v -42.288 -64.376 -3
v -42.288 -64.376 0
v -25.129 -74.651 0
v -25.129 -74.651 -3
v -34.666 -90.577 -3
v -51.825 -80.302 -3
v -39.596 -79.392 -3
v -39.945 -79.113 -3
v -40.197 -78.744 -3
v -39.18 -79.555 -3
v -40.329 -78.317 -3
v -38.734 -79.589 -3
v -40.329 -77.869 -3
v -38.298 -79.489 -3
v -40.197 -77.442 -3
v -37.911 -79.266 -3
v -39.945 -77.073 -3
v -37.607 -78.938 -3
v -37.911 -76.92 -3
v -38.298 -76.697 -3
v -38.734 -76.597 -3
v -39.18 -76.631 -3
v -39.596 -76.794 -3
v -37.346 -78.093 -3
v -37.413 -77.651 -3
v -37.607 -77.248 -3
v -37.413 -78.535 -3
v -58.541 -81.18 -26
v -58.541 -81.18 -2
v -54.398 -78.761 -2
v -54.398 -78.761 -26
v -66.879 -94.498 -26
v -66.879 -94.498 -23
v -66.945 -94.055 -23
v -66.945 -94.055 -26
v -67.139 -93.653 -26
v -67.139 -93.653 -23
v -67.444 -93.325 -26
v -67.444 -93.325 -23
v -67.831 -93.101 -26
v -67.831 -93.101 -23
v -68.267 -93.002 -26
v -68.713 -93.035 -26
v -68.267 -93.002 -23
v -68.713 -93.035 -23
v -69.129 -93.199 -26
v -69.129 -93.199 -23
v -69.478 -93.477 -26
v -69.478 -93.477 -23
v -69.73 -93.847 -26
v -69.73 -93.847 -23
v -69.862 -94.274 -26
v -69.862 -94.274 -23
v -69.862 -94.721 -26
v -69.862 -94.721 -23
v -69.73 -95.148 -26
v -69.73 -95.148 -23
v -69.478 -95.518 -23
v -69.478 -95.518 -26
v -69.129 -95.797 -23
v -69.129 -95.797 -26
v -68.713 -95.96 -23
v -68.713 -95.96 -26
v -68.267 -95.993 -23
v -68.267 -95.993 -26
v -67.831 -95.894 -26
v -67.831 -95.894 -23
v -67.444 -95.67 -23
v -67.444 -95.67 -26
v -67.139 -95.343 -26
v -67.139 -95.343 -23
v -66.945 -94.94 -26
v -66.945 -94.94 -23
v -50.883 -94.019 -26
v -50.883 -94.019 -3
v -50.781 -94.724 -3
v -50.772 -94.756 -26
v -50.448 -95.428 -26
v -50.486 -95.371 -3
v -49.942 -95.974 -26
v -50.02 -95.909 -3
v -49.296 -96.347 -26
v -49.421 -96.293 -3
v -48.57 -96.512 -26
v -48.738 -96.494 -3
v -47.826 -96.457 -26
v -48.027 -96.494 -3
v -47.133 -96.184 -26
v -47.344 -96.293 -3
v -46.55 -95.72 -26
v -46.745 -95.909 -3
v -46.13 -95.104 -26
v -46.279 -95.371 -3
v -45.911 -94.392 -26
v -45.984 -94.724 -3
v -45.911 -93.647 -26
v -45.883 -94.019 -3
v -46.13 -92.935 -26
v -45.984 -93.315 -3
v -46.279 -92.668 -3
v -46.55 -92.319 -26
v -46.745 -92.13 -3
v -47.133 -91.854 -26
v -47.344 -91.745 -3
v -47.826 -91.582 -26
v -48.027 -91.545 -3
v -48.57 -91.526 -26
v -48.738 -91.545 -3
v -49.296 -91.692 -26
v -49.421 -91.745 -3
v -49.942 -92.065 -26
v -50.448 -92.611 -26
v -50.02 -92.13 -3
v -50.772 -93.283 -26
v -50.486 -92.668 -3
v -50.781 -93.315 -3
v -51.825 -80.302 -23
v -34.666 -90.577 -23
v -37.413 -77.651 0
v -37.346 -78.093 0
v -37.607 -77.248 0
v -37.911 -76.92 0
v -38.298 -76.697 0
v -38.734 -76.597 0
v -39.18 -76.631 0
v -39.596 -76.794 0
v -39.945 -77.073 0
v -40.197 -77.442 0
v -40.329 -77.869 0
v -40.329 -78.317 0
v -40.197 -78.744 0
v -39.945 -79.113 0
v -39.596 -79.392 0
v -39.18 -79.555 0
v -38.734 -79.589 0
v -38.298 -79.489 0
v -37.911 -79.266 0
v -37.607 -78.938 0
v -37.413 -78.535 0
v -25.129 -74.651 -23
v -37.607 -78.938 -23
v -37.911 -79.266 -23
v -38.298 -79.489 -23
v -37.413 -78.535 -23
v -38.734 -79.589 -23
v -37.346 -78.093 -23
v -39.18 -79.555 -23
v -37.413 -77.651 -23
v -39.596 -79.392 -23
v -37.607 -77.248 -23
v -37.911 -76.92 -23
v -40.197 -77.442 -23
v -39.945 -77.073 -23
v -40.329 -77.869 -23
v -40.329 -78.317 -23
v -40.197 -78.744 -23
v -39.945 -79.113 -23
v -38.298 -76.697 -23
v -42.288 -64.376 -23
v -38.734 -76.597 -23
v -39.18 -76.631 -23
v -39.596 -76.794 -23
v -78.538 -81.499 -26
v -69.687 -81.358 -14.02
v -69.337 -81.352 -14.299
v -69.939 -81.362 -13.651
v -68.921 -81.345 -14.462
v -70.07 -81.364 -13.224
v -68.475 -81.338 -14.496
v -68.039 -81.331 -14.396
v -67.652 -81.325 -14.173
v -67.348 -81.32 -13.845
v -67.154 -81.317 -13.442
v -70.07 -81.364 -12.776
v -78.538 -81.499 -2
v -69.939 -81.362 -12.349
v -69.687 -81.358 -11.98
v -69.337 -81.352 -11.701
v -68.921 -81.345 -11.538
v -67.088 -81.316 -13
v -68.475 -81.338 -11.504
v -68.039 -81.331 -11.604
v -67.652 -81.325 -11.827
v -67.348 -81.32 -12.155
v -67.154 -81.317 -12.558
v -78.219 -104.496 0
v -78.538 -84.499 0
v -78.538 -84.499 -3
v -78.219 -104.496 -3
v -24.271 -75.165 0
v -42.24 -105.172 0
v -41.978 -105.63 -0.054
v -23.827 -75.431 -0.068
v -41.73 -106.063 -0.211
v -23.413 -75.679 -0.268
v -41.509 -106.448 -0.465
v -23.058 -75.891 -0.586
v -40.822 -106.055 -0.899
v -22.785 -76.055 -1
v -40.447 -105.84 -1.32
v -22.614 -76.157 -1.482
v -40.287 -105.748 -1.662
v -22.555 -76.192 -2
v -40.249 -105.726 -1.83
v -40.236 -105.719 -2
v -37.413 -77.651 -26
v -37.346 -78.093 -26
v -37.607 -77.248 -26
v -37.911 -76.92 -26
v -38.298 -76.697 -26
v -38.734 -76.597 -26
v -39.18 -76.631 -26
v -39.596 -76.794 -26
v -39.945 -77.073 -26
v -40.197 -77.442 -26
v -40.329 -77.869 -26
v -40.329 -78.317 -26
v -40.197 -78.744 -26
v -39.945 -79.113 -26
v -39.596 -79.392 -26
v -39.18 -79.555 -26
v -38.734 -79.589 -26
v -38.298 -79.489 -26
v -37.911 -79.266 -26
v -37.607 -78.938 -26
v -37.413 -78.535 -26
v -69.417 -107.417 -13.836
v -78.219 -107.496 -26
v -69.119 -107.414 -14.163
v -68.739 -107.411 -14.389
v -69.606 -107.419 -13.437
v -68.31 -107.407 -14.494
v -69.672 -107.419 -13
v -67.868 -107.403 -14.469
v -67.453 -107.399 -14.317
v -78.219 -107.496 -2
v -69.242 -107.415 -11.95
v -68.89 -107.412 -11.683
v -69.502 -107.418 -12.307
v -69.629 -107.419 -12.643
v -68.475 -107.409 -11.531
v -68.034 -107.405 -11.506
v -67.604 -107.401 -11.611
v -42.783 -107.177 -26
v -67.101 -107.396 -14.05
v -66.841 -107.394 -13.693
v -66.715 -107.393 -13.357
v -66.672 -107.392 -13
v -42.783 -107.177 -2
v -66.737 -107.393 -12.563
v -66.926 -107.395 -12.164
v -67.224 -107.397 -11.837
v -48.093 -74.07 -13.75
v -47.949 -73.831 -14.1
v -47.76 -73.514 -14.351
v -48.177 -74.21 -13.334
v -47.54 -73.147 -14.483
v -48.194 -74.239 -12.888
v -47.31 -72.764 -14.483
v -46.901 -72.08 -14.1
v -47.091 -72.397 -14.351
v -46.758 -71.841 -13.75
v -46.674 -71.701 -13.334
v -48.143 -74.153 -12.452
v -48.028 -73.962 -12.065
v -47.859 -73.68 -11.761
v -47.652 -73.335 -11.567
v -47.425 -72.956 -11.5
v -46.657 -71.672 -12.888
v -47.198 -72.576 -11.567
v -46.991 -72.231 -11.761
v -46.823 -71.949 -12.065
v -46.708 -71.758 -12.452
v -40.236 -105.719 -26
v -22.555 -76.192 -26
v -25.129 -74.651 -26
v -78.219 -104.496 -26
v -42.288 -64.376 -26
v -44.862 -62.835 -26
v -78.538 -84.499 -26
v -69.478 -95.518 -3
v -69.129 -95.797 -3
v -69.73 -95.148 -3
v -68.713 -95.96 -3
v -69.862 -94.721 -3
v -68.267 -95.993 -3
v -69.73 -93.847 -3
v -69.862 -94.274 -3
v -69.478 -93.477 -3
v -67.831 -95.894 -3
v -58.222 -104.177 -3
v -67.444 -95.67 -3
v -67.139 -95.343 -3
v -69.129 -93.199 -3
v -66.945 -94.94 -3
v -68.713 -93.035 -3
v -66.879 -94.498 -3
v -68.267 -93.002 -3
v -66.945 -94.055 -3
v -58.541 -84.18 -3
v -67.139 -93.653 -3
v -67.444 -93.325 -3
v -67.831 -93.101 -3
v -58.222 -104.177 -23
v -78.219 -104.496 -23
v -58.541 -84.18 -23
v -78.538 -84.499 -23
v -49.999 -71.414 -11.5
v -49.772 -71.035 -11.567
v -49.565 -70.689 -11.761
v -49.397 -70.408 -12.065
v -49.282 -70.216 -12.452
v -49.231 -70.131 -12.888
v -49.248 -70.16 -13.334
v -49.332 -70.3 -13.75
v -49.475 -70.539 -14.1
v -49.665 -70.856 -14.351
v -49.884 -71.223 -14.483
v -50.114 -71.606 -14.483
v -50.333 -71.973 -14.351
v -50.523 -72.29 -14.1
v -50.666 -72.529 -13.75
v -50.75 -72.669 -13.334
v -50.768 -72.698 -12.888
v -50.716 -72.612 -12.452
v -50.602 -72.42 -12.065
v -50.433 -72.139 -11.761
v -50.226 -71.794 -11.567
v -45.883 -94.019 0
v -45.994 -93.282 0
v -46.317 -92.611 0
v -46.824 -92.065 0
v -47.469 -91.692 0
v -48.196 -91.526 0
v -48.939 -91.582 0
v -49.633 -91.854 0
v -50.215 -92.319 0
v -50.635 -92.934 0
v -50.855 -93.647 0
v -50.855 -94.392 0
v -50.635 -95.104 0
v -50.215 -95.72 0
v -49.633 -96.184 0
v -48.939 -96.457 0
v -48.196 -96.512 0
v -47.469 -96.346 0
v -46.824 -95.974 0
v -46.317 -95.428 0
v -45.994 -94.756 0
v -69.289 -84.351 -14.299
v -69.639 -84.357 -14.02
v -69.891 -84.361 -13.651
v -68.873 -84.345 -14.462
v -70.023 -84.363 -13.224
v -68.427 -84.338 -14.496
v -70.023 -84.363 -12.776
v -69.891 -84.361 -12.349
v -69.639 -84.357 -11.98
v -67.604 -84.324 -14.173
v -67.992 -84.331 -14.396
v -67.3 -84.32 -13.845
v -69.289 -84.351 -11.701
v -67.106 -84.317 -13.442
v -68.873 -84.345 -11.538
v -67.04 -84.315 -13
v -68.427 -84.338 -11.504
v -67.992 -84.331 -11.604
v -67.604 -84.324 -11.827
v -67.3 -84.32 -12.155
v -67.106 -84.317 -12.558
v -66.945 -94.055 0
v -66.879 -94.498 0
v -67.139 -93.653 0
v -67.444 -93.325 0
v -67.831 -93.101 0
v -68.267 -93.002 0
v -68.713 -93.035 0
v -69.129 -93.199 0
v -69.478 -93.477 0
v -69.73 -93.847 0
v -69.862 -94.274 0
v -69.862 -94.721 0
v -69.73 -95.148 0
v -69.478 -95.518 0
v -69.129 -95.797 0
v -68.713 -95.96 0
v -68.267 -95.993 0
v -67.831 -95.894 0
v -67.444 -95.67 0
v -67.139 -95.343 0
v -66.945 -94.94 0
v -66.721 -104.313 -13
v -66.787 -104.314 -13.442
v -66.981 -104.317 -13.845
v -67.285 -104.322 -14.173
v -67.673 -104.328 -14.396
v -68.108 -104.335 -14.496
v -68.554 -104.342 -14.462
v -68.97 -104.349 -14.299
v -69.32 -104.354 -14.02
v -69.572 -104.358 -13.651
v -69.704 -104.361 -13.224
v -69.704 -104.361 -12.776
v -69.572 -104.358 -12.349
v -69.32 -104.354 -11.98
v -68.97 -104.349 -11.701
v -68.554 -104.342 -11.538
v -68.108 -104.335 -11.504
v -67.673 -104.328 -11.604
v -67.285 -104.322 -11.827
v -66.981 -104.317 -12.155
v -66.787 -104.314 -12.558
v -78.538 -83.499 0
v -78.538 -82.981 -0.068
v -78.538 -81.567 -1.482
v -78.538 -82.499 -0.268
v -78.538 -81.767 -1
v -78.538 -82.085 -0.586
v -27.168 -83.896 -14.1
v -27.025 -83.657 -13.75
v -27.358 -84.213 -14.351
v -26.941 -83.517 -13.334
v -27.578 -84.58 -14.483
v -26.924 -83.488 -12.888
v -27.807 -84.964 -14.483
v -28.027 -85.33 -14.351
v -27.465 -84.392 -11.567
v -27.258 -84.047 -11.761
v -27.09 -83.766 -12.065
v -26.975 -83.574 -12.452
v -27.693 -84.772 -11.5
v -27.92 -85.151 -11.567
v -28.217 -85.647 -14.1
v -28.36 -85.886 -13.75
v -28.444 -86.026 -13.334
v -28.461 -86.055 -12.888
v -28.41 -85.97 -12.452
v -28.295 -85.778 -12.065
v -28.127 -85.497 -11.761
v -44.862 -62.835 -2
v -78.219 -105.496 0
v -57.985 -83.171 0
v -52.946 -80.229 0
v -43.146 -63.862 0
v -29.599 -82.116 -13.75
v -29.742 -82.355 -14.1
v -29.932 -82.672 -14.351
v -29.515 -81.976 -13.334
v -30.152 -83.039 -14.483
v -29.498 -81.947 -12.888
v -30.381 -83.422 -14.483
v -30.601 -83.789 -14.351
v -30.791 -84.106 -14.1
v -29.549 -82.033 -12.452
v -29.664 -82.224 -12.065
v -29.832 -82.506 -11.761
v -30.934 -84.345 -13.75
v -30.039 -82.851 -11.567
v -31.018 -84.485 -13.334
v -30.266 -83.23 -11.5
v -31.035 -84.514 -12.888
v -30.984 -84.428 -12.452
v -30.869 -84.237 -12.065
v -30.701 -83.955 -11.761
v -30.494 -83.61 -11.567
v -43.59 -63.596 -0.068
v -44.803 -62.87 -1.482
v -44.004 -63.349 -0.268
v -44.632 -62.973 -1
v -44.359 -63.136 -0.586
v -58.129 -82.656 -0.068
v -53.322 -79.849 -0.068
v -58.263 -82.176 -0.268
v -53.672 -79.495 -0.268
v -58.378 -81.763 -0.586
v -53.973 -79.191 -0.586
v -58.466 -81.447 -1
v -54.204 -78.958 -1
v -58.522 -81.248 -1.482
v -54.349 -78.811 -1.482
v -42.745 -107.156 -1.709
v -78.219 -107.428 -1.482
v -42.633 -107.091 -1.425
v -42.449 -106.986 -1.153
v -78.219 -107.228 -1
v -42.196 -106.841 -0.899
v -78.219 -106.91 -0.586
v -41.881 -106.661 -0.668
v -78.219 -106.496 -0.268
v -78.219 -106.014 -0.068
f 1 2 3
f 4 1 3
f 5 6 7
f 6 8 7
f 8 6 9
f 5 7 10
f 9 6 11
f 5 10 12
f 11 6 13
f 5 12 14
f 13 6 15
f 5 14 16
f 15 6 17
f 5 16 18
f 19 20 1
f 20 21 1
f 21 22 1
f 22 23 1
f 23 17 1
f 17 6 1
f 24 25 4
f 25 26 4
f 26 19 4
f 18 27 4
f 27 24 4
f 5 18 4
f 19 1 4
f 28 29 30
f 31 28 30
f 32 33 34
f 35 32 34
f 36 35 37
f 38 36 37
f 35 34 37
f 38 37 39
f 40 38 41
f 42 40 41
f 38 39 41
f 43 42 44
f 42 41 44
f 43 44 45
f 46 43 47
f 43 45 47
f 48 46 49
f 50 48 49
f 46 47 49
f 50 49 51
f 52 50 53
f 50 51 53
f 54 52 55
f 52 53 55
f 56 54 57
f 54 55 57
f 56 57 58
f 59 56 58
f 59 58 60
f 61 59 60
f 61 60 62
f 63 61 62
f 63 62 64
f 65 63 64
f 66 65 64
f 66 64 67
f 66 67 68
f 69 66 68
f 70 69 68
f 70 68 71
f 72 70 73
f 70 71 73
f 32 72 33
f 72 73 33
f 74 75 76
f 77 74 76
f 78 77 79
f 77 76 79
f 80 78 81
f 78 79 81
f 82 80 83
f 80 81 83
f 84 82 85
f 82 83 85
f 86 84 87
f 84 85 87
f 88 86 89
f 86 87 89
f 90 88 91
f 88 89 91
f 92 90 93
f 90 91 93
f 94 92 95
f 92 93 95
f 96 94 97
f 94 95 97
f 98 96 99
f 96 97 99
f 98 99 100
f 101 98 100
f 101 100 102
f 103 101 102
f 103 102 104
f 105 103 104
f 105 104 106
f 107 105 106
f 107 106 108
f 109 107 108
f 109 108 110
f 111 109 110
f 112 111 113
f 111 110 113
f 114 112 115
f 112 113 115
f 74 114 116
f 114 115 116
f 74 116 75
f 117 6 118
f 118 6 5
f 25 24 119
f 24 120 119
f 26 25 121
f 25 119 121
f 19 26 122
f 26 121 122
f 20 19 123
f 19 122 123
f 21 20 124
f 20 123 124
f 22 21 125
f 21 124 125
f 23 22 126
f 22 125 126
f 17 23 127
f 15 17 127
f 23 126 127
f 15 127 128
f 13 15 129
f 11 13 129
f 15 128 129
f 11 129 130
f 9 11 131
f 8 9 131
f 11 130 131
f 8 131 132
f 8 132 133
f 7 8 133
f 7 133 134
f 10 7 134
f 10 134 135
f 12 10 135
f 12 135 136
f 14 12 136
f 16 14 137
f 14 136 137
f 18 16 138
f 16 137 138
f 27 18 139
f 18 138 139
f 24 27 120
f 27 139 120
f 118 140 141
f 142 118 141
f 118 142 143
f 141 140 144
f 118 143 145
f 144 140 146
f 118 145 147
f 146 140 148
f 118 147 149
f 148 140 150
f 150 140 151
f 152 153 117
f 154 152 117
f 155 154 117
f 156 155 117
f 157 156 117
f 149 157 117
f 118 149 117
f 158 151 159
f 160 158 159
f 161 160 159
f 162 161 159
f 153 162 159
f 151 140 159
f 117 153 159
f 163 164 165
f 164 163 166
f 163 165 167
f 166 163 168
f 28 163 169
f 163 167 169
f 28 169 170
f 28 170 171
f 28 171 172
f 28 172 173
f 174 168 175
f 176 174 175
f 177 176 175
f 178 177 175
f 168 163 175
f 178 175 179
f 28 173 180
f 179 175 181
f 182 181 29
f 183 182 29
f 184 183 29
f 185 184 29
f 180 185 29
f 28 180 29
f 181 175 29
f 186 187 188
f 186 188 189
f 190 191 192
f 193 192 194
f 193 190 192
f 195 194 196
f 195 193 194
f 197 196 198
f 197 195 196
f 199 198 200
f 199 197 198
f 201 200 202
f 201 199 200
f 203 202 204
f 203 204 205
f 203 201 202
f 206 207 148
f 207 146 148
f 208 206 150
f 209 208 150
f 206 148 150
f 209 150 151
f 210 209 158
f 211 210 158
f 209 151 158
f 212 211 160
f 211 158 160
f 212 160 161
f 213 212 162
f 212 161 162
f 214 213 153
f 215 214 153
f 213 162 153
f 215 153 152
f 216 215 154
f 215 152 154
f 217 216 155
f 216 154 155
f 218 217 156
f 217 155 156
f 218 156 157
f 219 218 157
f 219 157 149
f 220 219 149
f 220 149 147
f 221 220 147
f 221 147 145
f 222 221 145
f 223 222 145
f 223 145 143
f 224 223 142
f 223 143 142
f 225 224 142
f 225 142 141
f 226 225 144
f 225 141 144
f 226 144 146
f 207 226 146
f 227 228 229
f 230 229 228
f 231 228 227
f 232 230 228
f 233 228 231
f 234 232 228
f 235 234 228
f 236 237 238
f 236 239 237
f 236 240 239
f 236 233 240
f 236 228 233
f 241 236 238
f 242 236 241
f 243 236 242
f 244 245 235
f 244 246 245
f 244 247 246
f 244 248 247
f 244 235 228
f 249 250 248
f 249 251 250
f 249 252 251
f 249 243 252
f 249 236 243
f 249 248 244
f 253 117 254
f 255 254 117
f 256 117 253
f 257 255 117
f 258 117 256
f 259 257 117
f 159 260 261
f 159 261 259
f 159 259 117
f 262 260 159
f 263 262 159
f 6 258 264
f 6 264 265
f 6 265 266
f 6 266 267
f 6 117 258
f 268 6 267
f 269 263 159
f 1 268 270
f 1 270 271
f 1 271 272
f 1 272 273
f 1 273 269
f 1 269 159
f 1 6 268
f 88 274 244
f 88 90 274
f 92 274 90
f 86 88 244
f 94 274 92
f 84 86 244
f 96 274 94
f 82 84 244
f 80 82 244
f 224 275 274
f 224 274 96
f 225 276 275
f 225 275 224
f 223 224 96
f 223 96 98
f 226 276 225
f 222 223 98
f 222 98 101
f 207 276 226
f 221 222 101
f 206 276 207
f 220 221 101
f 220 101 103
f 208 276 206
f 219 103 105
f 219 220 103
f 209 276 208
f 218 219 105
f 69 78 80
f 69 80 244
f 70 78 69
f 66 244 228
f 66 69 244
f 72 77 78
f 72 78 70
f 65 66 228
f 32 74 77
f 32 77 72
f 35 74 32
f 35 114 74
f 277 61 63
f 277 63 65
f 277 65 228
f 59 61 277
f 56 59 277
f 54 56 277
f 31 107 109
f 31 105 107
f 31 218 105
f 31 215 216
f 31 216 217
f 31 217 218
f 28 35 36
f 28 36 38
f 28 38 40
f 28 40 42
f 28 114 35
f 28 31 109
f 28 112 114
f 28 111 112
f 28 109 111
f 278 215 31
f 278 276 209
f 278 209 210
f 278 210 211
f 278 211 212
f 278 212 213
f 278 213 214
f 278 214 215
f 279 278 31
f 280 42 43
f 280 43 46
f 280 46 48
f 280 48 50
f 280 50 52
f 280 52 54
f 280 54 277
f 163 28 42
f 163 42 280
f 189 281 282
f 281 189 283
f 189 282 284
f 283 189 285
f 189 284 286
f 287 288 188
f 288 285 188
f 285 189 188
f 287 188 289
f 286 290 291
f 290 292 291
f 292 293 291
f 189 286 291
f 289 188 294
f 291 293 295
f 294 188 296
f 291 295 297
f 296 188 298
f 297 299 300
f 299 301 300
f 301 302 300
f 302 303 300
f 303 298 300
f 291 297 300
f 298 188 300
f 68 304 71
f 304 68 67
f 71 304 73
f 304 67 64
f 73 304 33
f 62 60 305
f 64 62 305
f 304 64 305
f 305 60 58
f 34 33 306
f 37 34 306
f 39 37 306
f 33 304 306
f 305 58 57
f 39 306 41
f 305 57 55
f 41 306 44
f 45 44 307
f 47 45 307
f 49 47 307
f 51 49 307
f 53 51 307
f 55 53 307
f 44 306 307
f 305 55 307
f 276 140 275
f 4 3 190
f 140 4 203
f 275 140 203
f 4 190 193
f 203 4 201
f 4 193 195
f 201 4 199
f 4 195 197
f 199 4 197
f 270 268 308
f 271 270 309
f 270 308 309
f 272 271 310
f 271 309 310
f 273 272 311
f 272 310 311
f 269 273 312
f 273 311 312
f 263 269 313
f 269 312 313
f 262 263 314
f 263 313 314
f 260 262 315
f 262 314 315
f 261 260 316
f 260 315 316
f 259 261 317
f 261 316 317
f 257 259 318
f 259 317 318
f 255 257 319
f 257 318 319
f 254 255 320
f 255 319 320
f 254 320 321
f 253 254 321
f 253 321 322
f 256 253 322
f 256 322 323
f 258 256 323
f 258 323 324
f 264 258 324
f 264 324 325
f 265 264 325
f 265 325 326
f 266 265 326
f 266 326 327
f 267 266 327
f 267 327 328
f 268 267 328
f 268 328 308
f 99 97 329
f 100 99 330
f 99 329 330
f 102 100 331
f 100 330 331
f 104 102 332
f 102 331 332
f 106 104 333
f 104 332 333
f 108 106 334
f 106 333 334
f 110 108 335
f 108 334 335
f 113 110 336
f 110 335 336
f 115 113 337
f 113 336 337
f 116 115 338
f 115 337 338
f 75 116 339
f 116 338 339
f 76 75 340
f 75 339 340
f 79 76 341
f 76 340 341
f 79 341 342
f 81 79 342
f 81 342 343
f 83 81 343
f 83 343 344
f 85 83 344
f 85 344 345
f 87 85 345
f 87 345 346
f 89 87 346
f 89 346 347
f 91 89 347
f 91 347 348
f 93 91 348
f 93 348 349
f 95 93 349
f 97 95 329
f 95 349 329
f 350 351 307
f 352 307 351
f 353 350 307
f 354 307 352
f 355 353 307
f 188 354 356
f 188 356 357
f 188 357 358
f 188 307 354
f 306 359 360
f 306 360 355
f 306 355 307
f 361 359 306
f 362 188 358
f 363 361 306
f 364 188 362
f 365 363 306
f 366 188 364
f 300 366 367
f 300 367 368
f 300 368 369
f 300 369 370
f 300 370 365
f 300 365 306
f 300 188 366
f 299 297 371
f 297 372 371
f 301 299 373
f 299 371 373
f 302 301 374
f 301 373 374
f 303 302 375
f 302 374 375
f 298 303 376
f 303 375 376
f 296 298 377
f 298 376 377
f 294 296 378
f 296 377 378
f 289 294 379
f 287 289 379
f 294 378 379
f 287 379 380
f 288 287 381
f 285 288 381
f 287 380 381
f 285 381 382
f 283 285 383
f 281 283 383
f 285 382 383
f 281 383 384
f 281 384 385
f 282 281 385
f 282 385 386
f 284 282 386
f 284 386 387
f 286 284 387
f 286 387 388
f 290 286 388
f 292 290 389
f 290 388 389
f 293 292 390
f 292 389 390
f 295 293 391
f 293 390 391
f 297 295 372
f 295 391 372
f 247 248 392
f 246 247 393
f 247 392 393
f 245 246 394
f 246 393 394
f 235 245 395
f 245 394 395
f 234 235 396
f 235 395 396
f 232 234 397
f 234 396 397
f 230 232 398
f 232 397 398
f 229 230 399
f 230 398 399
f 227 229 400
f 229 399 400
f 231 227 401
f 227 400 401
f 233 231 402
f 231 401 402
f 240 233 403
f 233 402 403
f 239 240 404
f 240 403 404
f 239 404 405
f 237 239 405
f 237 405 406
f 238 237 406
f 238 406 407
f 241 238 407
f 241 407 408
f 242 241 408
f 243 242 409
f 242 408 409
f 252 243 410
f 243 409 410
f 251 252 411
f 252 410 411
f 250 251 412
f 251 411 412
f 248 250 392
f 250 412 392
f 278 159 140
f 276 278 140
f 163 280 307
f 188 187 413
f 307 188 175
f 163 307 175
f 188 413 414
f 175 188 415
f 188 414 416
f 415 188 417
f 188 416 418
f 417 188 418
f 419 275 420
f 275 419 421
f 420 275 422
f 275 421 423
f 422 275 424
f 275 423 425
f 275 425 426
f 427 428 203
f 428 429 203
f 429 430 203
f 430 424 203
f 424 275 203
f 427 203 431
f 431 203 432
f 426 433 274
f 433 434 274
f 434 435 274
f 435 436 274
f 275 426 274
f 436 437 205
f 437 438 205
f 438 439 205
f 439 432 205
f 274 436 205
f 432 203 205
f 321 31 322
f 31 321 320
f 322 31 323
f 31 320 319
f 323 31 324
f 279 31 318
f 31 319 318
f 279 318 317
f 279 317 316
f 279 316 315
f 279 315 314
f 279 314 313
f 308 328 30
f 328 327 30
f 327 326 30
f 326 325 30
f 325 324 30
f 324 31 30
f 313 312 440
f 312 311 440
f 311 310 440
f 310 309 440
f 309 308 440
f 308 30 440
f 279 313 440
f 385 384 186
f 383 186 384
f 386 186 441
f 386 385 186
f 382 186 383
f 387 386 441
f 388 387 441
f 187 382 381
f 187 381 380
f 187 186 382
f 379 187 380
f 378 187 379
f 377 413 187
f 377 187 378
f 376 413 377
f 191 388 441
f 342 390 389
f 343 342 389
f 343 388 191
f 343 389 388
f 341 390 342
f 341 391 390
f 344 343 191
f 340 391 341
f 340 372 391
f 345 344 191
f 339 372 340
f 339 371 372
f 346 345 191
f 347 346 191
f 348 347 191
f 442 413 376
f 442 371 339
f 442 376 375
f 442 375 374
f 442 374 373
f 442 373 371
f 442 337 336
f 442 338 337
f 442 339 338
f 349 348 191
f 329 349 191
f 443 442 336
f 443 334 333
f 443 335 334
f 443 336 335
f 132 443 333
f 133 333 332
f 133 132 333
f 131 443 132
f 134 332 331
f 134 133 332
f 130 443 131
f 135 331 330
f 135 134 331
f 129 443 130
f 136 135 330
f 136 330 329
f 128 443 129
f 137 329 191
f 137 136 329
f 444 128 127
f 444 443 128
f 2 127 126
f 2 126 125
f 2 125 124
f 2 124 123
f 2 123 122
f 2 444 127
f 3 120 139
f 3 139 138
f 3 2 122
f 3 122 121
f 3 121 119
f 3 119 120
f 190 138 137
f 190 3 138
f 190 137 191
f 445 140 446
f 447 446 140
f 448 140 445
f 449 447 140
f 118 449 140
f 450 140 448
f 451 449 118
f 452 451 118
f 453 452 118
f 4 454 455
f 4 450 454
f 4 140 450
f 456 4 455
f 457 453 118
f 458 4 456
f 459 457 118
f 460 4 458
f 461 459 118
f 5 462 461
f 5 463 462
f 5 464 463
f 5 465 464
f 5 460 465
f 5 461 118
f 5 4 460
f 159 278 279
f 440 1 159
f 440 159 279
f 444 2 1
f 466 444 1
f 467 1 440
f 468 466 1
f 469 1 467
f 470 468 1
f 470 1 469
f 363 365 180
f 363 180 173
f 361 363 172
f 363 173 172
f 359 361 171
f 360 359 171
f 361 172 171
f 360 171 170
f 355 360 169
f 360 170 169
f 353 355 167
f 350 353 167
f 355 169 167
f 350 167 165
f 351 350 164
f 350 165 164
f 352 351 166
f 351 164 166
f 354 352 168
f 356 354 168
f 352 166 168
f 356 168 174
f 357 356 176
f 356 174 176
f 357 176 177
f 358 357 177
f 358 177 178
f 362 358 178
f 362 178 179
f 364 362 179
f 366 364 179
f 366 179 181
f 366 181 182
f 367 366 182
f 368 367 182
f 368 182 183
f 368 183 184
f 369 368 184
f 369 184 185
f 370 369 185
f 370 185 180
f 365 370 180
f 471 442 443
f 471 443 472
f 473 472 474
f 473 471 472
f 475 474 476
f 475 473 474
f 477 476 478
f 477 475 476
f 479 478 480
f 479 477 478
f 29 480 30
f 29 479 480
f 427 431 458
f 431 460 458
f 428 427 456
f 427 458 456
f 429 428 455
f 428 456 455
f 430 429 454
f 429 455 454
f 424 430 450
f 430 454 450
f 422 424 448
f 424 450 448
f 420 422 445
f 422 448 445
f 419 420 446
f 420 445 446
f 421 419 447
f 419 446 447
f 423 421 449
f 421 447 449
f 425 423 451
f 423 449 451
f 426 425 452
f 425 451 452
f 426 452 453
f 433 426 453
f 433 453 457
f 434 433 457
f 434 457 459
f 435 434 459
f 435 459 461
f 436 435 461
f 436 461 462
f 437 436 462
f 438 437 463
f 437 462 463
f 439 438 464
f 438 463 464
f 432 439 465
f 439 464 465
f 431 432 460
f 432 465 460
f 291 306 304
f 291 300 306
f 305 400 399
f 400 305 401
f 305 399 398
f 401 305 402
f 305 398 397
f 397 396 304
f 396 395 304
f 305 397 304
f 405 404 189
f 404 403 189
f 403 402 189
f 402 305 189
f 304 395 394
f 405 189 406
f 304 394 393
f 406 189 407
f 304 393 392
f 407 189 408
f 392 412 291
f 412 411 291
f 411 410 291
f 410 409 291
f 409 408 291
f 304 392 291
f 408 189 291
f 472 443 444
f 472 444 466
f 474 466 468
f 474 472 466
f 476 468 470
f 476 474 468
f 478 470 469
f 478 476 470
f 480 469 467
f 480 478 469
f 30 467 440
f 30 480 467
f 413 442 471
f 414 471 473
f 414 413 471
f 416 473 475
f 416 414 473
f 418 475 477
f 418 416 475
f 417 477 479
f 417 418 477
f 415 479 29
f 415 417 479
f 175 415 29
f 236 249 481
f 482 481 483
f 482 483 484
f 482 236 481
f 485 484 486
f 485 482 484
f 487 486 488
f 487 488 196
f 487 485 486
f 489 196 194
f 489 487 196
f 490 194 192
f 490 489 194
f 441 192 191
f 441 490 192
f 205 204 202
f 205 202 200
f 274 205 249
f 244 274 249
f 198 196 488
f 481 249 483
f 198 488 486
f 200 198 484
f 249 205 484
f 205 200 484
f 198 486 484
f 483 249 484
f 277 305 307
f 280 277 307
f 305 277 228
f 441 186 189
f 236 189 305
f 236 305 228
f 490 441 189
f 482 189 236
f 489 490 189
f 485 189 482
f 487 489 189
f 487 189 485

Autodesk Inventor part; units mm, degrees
ref_plane "YZ Plane" through (0, 0, 0) normal (1, 0, 0) x (0, 1, 0)
ref_plane "XZ Plane" through (0, 0, 0) normal (0, 1, 0) x (-1, 0, 0)
ref_plane "XY Plane" through (0, 0, 0) normal (0, 0, 1) x (1, 0, 0)
sketch "Sketch1" plane through (0, 0, 0) normal (0, 0, 1) x (1, 0, 0)
  circle A0 centre (-48.3826, -94.0192) radius 2.5
  circle A1 centre (2.8152, 8.6005) radius 2.5
  line L0 (-48.3826, -94.0192) -> (40.5013, 54.4144)
  line L1 (2.8152, 8.6005) -> (32.8522, -42.034)
  line L2 (-2.0828, 38.9998) -> (-2.0828, -39)
  line L3 (-2.0828, -0.0001) -> (69.8745, -0.0001)
  line L4 (7.9172, -0.0001) -> (-0.6834, -5.1021)
  line L5 (2.8152, 8.6005) -> (7.9172, -0.0001)
  line L6 (7.9172, -0.0001) -> (16.5177, 5.1019)
  line L7 (7.9172, -0.0001) -> (-0.6834, -5.1021)
  line L8 (-0.6834, -5.1021) -> (-0.6834, -5.1021)
  line L9 (7.9172, -0.0001) -> (16.5177, 5.1019)
  line L10 (16.5177, 5.1019) -> (16.5177, 5.1019)
  line L11 (7.9172, -0.0001) -> (-0.6622, 5.1374)
  line L12 (7.9172, -0.0001) -> (16.4966, -5.1375)
  line L13 (-48.3826, -94.0192) -> (-43.2452, -85.4397)
  line L14 (-54.6233, -56.9895) -> (-9.7188, -83.8789)
  line L15 (-43.2452, -85.4397) -> (-34.6657, -90.5772)
  line L16 (-43.2452, -85.4397) -> (-51.8246, -80.3023)
  line L17 (-34.6657, -90.5772) -> (16.4966, -5.1375)
  line L18 (-0.6622, 5.1374) -> (-51.8246, -80.3023)
  line L19 (-3.7386, 0) -> (13.452, 10.2217)
  line L20 (-3.7386, 0) -> (13.4203, -10.2749)
  circle A2 centre (6.9172, -34) radius 2.5
  circle A3 centre (6.9172, -34) radius 5
  circle A4 centre (6.9172, 34) radius 2.5
  circle A5 centre (6.9172, 34) radius 4.9998
  line L21 (15.8878, 38.9998) -> (-2.0828, 38.9998)
  line L22 (-2.0828, -39) -> (15.933, -39)
  line L23 (-13.3434, -16.0398) -> (19.6624, -35.8041)
  line L24 (-13.3434, 16.0396) -> (19.6624, 35.8039)
  line L25 (-13.3434, -16.0398) -> (-15.9172, -14.4985)
  line L26 (-2.0828, -0.0001) -> (-26.2435, -0.0001)
  line L27 (-15.9172, -14.4985) -> (-7.2354, -0.0001)
  line L28 (-13.3434, 16.0396) -> (-15.9172, 14.4984)
  line L29 (-15.9172, 14.4984) -> (-7.2354, -0.0001)
  line L30 (13.4203, -10.2749) -> (15.9172, -11.7701)
  line L31 (15.933, -39) -> (15.8878, 38.9998)
  line L32 (13.452, 10.2217) -> (15.9037, 11.6795)
  line L33 (15.9037, 11.6795) -> (6.3124, 27.8097)
  line L34 (15.9172, -11.7701) -> (6.3124, -27.8099)
  line L35 (15.9037, 11.6795) -> (15.9172, -11.7701)
  line L36 (-15.9172, -14.4985) -> (-15.9172, 14.4984)
  line L37 (6.3124, 27.8097) -> (-15.9172, 14.4984) projected
  circle A6 centre (-48.3826, -94.0192) radius 2.5
  line L38 (-311.4249, 0) -> (127.5863, 0)
  line L39 (-170.3704, -117.2696) -> (-13.4682, 154.4931)
  line L40 (-102.6648, 0) -> (-157.9558, -95.7668)
  line L41 (-157.9558, -95.7668) -> (-48.3826, -94.0192)
  line L42 (-48.3826, -94.0192) -> (-58.3814, -94.1786)
  line L43 (-58.3814, -94.1786) -> (-58.5408, -84.1799)
  line L44 (-58.5408, -84.1799) -> (-58.2219, -104.1774)
  line L45 (-51.8246, -80.3023) -> (-41.5497, -63.1434)
  line L46 (-41.5497, -63.1434) -> (-24.3908, -73.4184)
  line L47 (-58.5408, -84.1799) -> (-78.5383, -84.4989)
  line L48 (-78.5383, -84.4989) -> (-78.2193, -104.4963)
  line L49 (-78.2193, -104.4963) -> (-58.2219, -104.1774)
  line L50 (-58.5408, -84.1799) -> (-51.8246, -80.3023)
  line L51 (-58.2219, -104.1774) -> (-26.2433, -104.1774)
  line L52 (-34.6657, -90.5772) -> (-48.6317, -113.8999)
  circle A7 centre (-48.3828, -94.0194) radius 2.5 projected
  point P0 (0, 0)
  point P1 (6.9172, -21)
  point P2 (-3.7386, 0)
  point P3 (-42.2878, -64.3761)
  point P4 (-42.8097, -104.1774)
  point P5 (-25.129, -74.6511)
  dimension "d0" = 10
  dimension "d1" = 10
  dimension "d2" = 10
  dimension "d3" = 10
  dimension "d4" = 10
  dimension "d5" = 10
  dimension "d6" = 10
  dimension "d7" = 10
  dimension "d8" = 10
  dimension "d9" = 10
  dimension "d10" = 10
  dimension "d11" = 20
  dimension "d12" = 20
  dimension "d13" = 3
  dimension "d14" = 3
  dimension "d20" = 110.582
  dimension "d21" = 10
  dimension "d22" = 10
  dimension "d23" = 20
  dimension "d24" = 20
  dimension "d25" = 20
  dimension "d26" = 121.827
  dimension "d27" = 146.9972
extrude "Extrusion1" add sketch "Sketch1" against normal blind 3 contours A0 L0 L15 L52 L51 L44 L41 | A0 L41 L43 L50 L16 L0 | L16 L18 L14 L0 | L0 L14 L17 L15 | L44 L49 L48 L41 | L41 L48 L47 L43
sketch "Sketch2" plane through (0, 0, -3) normal (0, 0, -1) x (-1, 0, 0)
  line L0 (51.8246, -80.3023) -> (42.2878, -64.3761) projected
  line L1 (25.129, -74.6511) -> (42.8097, -104.1774) projected
  line L2 (78.5383, -84.4989) -> (58.5408, -84.1799)
  line L3 (58.5408, -84.1799) -> (51.8246, -80.3023)
  line L4 (42.2878, -64.3761) -> (25.129, -74.6511)
  line L5 (78.5383, -84.4989) -> (78.2193, -104.4963)
  line L6 (58.5408, -84.1799) -> (58.5408, -81.1799)
  line L7 (51.8246, -80.3023) -> (54.3984, -78.761)
  line L8 (42.8097, -104.1774) -> (40.2359, -105.7186)
  line L9 (42.8097, -104.1774) -> (42.7827, -107.1772)
  line L10 (78.5383, -84.4989) -> (78.5383, -81.4989)
  line L11 (78.2193, -104.4963) -> (78.2193, -107.4963)
  line L12 (42.2878, -64.3761) -> (44.8616, -62.8349)
  line L13 (42.2878, -64.3761) -> (25.129, -74.6511) projected
  line L14 (25.129, -74.6511) -> (22.5551, -76.1923)
  line L15 (78.5383, -81.4989) -> (58.5408, -81.1799)
  line L16 (58.5408, -81.1799) -> (54.3984, -78.761)
  line L17 (54.3984, -78.761) -> (44.8616, -62.8349)
  line L18 (22.5551, -76.1923) -> (40.2359, -105.7186)
  line L19 (40.2359, -105.7186) -> (42.7827, -107.1772)
  line L20 (78.2193, -107.4963) -> (42.7827, -107.1772)
  line L21 (58.5408, -84.1799) -> (58.2219, -104.1774)
  line L22 (51.8246, -80.3023) -> (34.6657, -90.5772)
  circle A0 centre (48.3826, -94.0192) radius 2.5 projected
  circle A1 centre (48.3826, -94.0192) radius 2.5
  line L23 (78.2193, -104.4963) -> (42.8097, -104.1774)
  line L24 (58.2219, -104.1774) -> (42.8097, -104.1774) projected
  line L25 (78.2193, -104.4963) -> (58.2219, -104.1774) projected
  point P0 (0, 0)
  dimension "d30" = 3
  dimension "d31" = 3
  dimension "d32" = 3
  dimension "d33" = 3
  dimension "d34" = 3
  dimension "d35" = 3
  dimension "d36" = 3
  dimension "d37" = 3
extrude "Extrusion2" add sketch "Sketch2" along normal blind 20 and the other way blind 3 contours L7 L16 L6 L3 | L0 L12 L17 L7 | L6 L15 L10 L2 | L1 L8 L18 L14 | L25 L23 L24 | L9 L19 L8 | L23 L11 L20 L9
sketch "Sketch3" plane through (0, 0, -3) normal (0, 0, -1) x (-1, 0, 0)
  line L0 (58.5408, -84.1799) -> (51.8246, -80.3023) projected
  line L1 (51.8246, -80.3023) -> (34.6657, -90.5772)
  line L2 (25.129, -74.6511) -> (42.8097, -104.1774) projected
  line L3 (42.8097, -104.1774) -> (58.2219, -104.1774) projected
  line L4 (58.5408, -84.1799) -> (58.2219, -104.1774)
  line L5 (78.2193, -104.4963) -> (42.8097, -104.1774) projected
  line L6 (42.8097, -104.1774) -> (25.129, -74.6511) projected
  circle A0 centre (48.3828, -94.0194) radius 2.5 projected
  point P0 (0, 0)
  dimension "d42" = 119.086
extrude "Extrusion3" add sketch "Sketch3" along normal blind 20
sketch "Sketch4" plane through (0, 0, -23) normal (0, 0, -1) x (-1, 0, 0)
  point P0 (0, 0)
sketch "Sketch5" plane through (0, 0, -23) normal (0, 0, -1) x (-1, 0, 0)
  circle A0 centre (48.3828, -94.0194) radius 2.5 projected
  line L0 (44.8616, -62.8349) -> (42.2878, -64.3761) projected
  line L1 (42.2878, -64.3761) -> (51.8246, -80.3023) projected
  line L2 (51.8246, -80.3023) -> (34.6657, -90.5772) projected
  line L3 (34.6657, -90.5772) -> (25.129, -74.6511) projected
  line L4 (25.129, -74.6511) -> (22.5551, -76.1923) projected
  line L5 (22.5551, -76.1923) -> (40.2359, -105.7186) projected
  line L6 (40.2359, -105.7186) -> (42.7827, -107.1772) projected
  line L7 (42.7827, -107.1772) -> (78.2193, -107.4963) projected
  line L8 (78.2193, -107.4963) -> (78.2193, -104.4963) projected
  line L9 (78.2193, -104.4963) -> (58.2219, -104.1774) projected
  line L10 (58.2219, -104.1774) -> (58.5408, -84.1799) projected
  line L11 (58.5408, -84.1799) -> (78.5383, -84.4989) projected
  line L12 (78.5383, -84.4989) -> (78.5383, -81.4989) projected
  line L13 (78.5383, -81.4989) -> (58.5408, -81.1799) projected
  line L14 (58.5408, -81.1799) -> (54.3984, -78.761) projected
  line L15 (54.3984, -78.761) -> (44.8616, -62.8349) projected
  line L16 (58.5408, -84.1799) -> (58.2219, -104.1774) projected
  line L17 (58.2219, -104.1774) -> (78.2193, -104.4963) projected
  line L18 (78.2193, -104.4963) -> (78.5383, -84.4989) projected
  line L19 (78.5383, -84.4989) -> (58.5408, -84.1799) projected
  line L20 (34.6657, -90.5772) -> (51.8246, -80.3023) projected
  line L21 (51.8246, -80.3023) -> (42.2878, -64.3761) projected
  line L22 (42.2878, -64.3761) -> (25.129, -74.6511) projected
  line L23 (25.129, -74.6511) -> (34.6657, -90.5772) projected
  point P0 (0, 0)
extrude "Extrusion4" add sketch "Sketch5" along normal blind 3
sketch "Sketch6" plane through (0, 0, 0) normal (0, 0, 1) x (1, 0, 0)
  line L0 (-42.2878, -64.3761) -> (-25.129, -74.6511) projected
  line L1 (-33.7084, -69.5136) -> (-49.5228, -95.9232)
  line L2 (-33.7084, -69.5136) -> (-38.8459, -78.093)
  circle A0 centre (-38.8459, -78.093) radius 1.5
  line L3 (-78.5383, -84.4989) -> (-78.2193, -104.4963) projected
  line L4 (-78.3788, -94.4976) -> (-68.3788, -94.4976)
  circle A1 centre (-68.3788, -94.4976) radius 1.5
  point P0 (0, 0)
  dimension "d47" = 10
  dimension "d48" = 3
  dimension "d56" = 10
  dimension "d57" = 3
extrude "Extrusion5" cut sketch "Sketch6" against normal through all
sketch "Sketch7" plane through (-44.8616, -62.8349, -26) normal (-0.857942, 0.5137465, 0) x (0, 0, 1)
  line L0 (0, 0) -> (26, 0) projected
  line L1 (26, 0) -> (13, 0)
  line L2 (13, 0) -> (13, -10)
  line L3 (13, -10) -> (26, -10)
  line L4 (26, -10) -> (26, 0)
  circle A0 centre (13, -10) radius 1.5
  point P0 (26, 76.9562)
  dimension "d51" = 13
  dimension "d52" = 10
  dimension "d53" = 3
extrude "Extrusion6" cut sketch "Sketch7" against normal through all contours A0 L3 L2 | L2 L3 A0
sketch "Sketch8" plane through (-58.5408, -81.1799, 0) normal (-0.0159478, 0.9998728, 0) x (0.9998728, 0.0159478, 0)
  line L0 (-20.0478, 3) -> (-20.0478, 23) projected
  line L1 (-20.0478, 13) -> (-10.0478, 13)
  circle A0 centre (-10.0478, 13) radius 1.5
  point P0 (59.828, 0)
  dimension "d58" = 10
  dimension "d59" = 3
extrude "Extrusion7" cut sketch "Sketch8" against normal through all
fillet "Fillet1" radius 2 5 edges at (-60.501, -107.3368, 0) (-31.3955, -90.9554, 0) (-49.63, -70.798, 0) (-68.5396, -81.3394, 0) (-56.4696, -79.9705, 0)
properties part number "2020_nodes_conn" material "PET Plastic"
